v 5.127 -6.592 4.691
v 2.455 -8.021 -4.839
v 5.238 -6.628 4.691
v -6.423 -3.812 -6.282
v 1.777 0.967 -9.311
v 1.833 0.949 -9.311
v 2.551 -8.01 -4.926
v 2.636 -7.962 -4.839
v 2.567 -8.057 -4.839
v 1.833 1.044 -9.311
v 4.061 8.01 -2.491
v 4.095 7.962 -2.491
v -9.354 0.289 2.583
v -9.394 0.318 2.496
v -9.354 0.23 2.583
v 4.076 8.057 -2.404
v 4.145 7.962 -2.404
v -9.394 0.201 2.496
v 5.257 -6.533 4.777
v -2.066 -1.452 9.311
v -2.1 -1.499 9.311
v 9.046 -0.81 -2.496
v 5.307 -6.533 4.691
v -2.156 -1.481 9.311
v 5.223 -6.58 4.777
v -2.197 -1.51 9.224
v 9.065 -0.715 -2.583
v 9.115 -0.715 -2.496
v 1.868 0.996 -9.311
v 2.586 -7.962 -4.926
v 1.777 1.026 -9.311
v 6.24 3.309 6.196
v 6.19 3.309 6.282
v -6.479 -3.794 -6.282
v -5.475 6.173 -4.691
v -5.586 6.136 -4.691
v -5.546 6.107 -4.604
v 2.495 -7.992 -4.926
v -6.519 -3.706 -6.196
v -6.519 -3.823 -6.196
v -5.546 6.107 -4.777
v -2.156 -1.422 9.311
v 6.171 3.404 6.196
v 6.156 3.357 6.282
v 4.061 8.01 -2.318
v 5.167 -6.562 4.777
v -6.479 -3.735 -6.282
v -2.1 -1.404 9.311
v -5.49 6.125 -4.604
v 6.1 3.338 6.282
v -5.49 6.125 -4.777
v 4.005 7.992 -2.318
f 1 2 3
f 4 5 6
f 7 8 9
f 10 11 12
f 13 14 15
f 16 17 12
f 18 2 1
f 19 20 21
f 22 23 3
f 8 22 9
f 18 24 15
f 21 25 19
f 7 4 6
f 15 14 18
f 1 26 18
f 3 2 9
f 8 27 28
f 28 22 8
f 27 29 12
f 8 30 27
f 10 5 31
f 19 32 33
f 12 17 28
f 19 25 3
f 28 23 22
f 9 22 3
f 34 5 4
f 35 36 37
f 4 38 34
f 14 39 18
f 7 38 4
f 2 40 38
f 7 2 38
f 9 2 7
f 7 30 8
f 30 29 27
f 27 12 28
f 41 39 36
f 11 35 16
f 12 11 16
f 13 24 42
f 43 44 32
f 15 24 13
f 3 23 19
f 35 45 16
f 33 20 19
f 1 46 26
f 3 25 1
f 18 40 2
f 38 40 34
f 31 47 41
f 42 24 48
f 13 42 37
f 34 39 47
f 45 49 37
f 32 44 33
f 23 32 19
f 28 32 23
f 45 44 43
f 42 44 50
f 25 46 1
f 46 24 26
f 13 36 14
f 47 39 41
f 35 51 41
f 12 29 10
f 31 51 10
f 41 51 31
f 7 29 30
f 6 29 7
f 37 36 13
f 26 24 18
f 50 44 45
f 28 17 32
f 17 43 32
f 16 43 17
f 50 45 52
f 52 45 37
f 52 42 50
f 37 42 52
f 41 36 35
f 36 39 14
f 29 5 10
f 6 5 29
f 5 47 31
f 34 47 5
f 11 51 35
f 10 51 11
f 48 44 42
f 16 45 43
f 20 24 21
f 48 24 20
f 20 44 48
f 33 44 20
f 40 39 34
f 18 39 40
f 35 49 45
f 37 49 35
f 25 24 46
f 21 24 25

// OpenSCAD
// Auto-generated OpenSCAD file

    inner_points = 10*[[-0.9313235840465552, 0.025941713534936496, 0.24961039887898973], [0.18176070420337553, 0.09962140742080969, -0.9224171855702517], [-0.21156256215452457, -0.14515796252296415, 0.9224171855702517], [0.9015217260954063, -0.07147826863709097, -0.24961039887898973], [-0.6438494477287671, -0.3764461593931605, -0.6195516232254873], [-0.5505502074210448, 0.607754695616786, -0.46907262550257495], [0.5207483494698958, -0.6532912507189405, 0.46907262550257495], [0.6140475897776181, 0.330909604291006, 0.6195516232254873], [0.2535803612941774, -0.7962352175813989, -0.48391650792537955], [0.4045417032366162, 0.7962352175814017, -0.24043637501668932]];

    outer_points = 10*[[-0.46997284627252917, -0.8078951994968868, 0.17589589984947596], [-0.43345305778897786, 0.8078951994968868, 0.25284835477167783], [0.43345305778897786, -0.8078951994968868, -0.25284835477167783], [0.46997284627252917, 0.8078951994968868, -0.17589589984947596], [-0.9449617853062939, 0.026321601166102375, -0.10422521197036727], [-0.5168120337823261, -0.026321601166102375, 0.7979479884286332], [0.5168120337823261, 0.026321601166102375, -0.7979479884286332], [0.9449617853062939, -0.026321601166102375, 0.10422521197036727], [-0.3350951898479052, 0.5418959379620255, -0.7060938346625941], [0.3576656603926969, 0.45671744731188046, 0.753653067322259]];

    // Convex hull for inner set (I)
    module inner_hull() {
        hull() {
            for (p = inner_points) {
                translate(p) sphere(r=0.1);
            }
        }
    }

    // Convex hull for outer set (O) minus inner hull (O \ I)
    module outer_minus_inner() {
        difference() {
            hull() {
                for (p = outer_points) {
                    translate(p) sphere(r=0.1);
                }
            }
            inner_hull(); // Subtract inner hull
        }
    }

    // Convex hull for outer set (O) minus all translated inner hulls
    module outer_minus_AllTranslationInner() {
        difference() {
            hull() {
                for (p = outer_points) {
                    translate(p) sphere(r=0.1);
                }
            }
            hull() {
                translate([0,0,50]) inner_hull();
                translate([0,0,-50]) inner_hull();
            }; // Subtract translated inner hulls
        }
    }

    // Difference between outer_minus_inner and outer_minus_AllTranslationInner
    module outer_minus_inner_diff() {
        difference() {
            // Outer minus inner
            difference() {
                hull() {
                    for (p = outer_points) {
                        translate(p) sphere(r=0.1);
                    }
                }
                inner_hull();
            }

            // Subtract Outer minus AllTranslationInner
            difference() {
                hull() {
                    for (p = outer_points) {
                        translate(p) sphere(r=0.1);
                    }
                }
                hull() {
                    translate([0,0,50]) inner_hull();
                    translate([0,0,-50]) inner_hull();
                };
            }
        }
    }

    // Rendering all with colors applied
    color([1, 0, 0, 0.5]) inner_hull(); // Transparent red
    
